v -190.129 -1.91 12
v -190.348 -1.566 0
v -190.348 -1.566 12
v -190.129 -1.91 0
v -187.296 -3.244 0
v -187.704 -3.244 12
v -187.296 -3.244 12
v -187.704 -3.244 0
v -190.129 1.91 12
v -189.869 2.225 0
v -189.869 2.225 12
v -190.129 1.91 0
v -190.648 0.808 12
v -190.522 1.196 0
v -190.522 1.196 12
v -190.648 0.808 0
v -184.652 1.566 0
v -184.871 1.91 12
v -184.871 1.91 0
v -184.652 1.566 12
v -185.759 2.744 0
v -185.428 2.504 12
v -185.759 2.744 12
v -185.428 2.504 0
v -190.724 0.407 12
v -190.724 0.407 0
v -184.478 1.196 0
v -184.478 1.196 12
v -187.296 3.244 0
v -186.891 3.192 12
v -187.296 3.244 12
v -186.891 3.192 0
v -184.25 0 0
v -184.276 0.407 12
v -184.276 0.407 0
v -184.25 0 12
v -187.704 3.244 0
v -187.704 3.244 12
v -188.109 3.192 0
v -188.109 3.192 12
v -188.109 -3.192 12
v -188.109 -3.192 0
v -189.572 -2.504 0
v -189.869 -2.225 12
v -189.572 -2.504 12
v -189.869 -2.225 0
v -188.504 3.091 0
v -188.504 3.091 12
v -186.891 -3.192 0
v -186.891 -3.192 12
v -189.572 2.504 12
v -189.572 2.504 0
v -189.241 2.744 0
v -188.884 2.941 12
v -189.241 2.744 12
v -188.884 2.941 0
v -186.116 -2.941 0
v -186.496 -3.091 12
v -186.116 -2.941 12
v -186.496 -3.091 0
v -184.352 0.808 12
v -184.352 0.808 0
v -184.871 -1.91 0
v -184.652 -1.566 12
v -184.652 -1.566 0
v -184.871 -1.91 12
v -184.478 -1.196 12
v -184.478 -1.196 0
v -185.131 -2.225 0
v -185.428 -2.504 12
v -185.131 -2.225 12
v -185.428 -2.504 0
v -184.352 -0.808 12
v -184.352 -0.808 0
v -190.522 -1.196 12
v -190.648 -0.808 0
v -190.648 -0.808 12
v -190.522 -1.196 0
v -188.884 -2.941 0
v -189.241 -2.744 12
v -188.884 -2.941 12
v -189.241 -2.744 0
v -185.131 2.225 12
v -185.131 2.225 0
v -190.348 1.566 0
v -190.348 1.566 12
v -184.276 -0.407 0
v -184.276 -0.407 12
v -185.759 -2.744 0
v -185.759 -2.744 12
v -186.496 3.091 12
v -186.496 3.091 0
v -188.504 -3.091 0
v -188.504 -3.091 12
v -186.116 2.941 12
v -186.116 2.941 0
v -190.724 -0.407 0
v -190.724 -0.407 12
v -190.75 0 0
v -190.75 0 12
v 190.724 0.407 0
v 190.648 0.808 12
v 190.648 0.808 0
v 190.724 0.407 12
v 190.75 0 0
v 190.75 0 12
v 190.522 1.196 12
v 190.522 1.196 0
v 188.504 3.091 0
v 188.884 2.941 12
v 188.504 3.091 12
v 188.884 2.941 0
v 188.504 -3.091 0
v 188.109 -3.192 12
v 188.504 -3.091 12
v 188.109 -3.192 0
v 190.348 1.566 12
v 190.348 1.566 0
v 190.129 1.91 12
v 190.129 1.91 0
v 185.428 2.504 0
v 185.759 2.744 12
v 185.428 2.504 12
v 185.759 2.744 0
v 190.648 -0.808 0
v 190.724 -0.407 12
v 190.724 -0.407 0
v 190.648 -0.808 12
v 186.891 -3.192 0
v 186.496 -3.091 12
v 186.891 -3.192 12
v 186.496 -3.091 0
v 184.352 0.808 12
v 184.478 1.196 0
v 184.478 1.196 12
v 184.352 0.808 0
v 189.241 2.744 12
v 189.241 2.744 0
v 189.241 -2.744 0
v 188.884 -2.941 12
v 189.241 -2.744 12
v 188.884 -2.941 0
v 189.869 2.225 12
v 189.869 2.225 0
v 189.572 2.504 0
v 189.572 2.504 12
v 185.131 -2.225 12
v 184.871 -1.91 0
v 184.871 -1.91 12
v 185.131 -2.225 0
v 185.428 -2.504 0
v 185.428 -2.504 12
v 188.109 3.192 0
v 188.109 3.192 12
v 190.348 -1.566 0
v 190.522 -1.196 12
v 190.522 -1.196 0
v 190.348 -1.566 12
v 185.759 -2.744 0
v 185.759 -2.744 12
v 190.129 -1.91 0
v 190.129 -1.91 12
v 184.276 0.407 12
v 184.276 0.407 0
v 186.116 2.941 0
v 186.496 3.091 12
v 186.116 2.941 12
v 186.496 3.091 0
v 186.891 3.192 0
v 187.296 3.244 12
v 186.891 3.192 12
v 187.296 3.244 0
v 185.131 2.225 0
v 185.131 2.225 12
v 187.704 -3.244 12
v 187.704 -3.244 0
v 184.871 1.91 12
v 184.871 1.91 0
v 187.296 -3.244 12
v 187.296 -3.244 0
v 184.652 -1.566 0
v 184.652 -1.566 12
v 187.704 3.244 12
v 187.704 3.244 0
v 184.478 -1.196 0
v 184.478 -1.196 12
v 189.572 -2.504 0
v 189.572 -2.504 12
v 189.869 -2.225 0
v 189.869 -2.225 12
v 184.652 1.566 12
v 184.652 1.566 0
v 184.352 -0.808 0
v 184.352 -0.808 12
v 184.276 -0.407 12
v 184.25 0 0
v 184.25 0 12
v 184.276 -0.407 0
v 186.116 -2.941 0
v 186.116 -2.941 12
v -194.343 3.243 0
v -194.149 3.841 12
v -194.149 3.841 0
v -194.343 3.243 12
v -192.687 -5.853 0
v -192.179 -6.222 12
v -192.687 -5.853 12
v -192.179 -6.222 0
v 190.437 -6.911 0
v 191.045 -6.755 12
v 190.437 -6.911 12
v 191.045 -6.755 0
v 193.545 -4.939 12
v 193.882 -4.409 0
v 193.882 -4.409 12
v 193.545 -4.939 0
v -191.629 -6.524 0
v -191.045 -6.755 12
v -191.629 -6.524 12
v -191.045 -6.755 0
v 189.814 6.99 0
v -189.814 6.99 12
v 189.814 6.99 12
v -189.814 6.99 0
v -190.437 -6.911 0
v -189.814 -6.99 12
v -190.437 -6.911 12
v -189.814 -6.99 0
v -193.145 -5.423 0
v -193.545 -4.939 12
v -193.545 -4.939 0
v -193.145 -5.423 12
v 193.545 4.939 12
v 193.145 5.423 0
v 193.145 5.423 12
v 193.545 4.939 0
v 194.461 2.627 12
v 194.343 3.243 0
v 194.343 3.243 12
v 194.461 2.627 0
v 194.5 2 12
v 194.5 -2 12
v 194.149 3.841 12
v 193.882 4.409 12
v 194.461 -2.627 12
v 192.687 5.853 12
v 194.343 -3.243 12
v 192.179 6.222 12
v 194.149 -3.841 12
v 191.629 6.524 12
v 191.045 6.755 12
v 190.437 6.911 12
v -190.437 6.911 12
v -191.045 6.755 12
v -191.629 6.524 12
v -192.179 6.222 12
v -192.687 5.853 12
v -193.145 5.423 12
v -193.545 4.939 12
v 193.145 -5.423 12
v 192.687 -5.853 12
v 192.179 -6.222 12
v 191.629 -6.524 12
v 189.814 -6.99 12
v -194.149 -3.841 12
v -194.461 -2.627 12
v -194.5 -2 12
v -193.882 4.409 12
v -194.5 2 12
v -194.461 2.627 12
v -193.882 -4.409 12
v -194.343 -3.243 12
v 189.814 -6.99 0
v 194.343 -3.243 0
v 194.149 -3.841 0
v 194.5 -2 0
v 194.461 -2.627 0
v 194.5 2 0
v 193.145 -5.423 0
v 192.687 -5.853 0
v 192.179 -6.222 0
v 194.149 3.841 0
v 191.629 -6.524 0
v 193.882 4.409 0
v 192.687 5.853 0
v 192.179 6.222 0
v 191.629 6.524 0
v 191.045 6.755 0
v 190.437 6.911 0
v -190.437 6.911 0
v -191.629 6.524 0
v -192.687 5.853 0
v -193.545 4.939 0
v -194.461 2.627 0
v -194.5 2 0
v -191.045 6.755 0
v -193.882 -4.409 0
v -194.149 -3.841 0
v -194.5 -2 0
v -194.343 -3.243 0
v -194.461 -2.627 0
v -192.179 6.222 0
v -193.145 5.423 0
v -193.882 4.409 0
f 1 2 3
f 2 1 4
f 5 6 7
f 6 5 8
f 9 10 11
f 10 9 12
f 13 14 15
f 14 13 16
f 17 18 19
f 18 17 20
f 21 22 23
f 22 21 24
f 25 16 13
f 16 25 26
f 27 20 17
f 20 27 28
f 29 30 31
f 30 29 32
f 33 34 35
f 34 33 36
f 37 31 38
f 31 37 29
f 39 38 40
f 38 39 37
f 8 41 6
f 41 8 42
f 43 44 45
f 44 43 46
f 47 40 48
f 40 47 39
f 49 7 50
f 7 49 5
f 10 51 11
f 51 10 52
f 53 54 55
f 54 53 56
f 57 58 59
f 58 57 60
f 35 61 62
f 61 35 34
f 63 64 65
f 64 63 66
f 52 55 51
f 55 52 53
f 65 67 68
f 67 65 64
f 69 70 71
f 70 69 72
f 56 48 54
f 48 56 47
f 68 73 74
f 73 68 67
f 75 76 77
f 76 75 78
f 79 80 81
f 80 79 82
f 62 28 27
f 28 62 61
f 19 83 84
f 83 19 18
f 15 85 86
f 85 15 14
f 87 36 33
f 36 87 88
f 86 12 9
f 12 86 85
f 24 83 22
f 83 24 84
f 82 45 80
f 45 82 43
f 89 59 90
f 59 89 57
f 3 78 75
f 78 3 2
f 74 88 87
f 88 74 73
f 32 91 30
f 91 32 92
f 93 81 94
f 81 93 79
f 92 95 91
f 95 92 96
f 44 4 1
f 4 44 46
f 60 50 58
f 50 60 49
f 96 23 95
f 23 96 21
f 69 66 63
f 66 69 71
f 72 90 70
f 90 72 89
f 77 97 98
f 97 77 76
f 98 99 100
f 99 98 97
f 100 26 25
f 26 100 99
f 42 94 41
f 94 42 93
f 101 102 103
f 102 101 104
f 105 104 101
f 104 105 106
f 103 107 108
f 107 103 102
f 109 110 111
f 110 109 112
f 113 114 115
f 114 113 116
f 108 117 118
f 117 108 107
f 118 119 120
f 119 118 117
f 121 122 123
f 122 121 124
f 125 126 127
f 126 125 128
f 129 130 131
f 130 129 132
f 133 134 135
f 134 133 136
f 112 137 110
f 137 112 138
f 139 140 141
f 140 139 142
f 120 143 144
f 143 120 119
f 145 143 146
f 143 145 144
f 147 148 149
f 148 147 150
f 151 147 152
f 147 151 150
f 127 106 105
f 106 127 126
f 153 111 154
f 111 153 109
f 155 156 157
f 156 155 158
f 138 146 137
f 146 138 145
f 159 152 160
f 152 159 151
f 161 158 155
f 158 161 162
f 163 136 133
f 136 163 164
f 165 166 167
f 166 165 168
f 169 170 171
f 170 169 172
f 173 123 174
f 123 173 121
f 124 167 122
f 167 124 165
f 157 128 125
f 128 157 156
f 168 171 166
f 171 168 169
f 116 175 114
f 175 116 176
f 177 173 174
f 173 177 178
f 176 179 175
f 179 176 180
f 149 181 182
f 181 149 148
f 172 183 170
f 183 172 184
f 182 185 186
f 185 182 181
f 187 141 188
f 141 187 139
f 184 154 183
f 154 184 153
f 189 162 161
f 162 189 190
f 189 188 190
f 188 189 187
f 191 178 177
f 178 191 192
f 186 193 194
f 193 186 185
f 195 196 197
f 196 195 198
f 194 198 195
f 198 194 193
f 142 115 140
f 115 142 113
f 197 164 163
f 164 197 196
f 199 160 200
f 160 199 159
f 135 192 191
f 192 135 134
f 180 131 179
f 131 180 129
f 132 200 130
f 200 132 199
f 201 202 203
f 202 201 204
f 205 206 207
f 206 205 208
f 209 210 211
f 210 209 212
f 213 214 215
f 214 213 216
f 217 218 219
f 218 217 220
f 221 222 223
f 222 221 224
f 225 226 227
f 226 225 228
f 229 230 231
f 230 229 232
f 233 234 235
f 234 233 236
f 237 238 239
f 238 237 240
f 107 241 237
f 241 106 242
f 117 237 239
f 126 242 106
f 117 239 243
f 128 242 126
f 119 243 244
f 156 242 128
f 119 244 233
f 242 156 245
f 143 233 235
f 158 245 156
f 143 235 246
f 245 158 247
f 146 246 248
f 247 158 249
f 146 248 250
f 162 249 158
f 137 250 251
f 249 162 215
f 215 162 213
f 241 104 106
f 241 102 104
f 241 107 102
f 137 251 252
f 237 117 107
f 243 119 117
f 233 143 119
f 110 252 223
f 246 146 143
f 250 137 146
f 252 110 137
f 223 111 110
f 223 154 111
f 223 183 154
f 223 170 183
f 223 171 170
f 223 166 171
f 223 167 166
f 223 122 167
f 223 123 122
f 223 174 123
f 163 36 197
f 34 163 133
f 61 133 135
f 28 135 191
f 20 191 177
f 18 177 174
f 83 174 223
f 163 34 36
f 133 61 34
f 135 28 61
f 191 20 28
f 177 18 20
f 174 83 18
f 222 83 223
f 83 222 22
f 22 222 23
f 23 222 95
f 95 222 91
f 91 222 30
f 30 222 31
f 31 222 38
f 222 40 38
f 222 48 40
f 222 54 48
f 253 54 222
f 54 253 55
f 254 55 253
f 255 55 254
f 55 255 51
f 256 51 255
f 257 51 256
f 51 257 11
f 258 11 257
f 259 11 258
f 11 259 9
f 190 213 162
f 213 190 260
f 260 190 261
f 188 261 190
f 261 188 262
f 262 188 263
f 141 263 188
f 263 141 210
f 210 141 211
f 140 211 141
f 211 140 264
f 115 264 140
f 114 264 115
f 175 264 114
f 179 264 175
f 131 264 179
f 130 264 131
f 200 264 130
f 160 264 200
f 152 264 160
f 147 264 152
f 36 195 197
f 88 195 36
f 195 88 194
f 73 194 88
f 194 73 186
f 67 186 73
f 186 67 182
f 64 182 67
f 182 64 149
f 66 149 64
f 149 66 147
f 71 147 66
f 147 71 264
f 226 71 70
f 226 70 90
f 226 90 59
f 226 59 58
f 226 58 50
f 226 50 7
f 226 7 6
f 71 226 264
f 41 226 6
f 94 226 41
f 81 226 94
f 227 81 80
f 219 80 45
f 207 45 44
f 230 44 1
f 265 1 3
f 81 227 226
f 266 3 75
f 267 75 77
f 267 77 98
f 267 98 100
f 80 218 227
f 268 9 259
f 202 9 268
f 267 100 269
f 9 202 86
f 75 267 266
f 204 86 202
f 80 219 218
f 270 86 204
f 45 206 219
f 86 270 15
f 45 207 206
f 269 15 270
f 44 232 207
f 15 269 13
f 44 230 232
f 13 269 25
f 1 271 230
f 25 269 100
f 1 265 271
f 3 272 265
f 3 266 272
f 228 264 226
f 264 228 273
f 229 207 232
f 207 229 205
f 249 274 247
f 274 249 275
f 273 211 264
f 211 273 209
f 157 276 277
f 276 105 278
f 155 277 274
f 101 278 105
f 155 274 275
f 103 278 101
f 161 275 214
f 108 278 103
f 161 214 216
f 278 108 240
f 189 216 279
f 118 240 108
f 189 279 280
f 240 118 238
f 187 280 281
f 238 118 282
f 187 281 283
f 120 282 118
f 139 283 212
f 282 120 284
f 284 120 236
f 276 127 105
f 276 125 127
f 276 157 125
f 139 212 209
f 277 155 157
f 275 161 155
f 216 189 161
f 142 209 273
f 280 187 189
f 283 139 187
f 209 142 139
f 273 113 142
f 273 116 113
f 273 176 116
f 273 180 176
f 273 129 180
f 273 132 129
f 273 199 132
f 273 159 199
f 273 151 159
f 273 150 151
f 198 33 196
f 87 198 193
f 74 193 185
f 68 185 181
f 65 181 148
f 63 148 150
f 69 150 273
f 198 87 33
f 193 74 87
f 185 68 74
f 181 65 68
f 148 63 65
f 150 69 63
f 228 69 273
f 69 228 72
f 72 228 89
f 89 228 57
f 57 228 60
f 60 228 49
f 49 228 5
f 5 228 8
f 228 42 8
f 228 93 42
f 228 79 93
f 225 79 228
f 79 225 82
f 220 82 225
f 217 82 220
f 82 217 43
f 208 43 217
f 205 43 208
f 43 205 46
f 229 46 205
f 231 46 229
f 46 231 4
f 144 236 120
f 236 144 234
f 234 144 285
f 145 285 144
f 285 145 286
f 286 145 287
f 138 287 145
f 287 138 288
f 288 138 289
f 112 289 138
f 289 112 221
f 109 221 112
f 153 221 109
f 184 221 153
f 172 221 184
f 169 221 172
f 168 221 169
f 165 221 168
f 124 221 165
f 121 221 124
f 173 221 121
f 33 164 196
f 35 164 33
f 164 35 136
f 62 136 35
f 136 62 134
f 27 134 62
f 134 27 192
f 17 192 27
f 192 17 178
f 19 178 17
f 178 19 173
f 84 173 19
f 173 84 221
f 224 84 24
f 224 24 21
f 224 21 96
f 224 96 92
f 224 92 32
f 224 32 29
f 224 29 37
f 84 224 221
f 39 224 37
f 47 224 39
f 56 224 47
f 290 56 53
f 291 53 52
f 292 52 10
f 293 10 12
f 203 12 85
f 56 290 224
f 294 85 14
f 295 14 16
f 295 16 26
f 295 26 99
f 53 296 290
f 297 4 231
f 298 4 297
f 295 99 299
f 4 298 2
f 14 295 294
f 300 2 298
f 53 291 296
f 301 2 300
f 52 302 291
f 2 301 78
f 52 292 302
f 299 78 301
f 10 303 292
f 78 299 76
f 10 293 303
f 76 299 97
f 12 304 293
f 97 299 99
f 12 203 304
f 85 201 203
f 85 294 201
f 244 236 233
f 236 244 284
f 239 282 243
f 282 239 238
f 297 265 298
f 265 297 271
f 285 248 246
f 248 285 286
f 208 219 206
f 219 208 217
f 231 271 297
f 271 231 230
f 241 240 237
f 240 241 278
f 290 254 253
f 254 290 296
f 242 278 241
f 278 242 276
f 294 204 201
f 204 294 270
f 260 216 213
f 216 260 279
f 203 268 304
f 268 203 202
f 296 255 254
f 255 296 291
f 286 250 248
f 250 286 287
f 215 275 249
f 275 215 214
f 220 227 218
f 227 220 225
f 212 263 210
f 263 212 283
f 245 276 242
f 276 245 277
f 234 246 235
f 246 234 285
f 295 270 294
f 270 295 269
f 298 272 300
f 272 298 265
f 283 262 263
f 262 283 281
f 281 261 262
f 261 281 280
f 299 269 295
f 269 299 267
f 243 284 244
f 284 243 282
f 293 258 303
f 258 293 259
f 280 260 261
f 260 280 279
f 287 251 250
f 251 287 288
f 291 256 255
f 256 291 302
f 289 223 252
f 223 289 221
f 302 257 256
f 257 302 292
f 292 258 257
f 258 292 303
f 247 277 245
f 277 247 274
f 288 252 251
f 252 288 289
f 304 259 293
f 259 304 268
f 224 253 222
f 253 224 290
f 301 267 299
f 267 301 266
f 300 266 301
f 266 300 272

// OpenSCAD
$fn = 50;


difference() {
	union() {
		hull() {
			translate(v = [-189.5000000000, 2.0000000000, 0]) {
				cylinder(h = 12, r = 5);
			}
			translate(v = [189.5000000000, 2.0000000000, 0]) {
				cylinder(h = 12, r = 5);
			}
			translate(v = [-189.5000000000, -2.0000000000, 0]) {
				cylinder(h = 12, r = 5);
			}
			translate(v = [189.5000000000, -2.0000000000, 0]) {
				cylinder(h = 12, r = 5);
			}
		}
	}
	union() {
		translate(v = [-187.5000000000, 0.0000000000, -100.0000000000]) {
			cylinder(h = 200, r = 3.2500000000);
		}
		translate(v = [-187.5000000000, 0.0000000000, -100.0000000000]) {
			cylinder(h = 200, r = 3.2500000000);
		}
		translate(v = [187.5000000000, 0.0000000000, -100.0000000000]) {
			cylinder(h = 200, r = 3.2500000000);
		}
		translate(v = [187.5000000000, 0.0000000000, -100.0000000000]) {
			cylinder(h = 200, r = 3.2500000000);
		}
	}
}
